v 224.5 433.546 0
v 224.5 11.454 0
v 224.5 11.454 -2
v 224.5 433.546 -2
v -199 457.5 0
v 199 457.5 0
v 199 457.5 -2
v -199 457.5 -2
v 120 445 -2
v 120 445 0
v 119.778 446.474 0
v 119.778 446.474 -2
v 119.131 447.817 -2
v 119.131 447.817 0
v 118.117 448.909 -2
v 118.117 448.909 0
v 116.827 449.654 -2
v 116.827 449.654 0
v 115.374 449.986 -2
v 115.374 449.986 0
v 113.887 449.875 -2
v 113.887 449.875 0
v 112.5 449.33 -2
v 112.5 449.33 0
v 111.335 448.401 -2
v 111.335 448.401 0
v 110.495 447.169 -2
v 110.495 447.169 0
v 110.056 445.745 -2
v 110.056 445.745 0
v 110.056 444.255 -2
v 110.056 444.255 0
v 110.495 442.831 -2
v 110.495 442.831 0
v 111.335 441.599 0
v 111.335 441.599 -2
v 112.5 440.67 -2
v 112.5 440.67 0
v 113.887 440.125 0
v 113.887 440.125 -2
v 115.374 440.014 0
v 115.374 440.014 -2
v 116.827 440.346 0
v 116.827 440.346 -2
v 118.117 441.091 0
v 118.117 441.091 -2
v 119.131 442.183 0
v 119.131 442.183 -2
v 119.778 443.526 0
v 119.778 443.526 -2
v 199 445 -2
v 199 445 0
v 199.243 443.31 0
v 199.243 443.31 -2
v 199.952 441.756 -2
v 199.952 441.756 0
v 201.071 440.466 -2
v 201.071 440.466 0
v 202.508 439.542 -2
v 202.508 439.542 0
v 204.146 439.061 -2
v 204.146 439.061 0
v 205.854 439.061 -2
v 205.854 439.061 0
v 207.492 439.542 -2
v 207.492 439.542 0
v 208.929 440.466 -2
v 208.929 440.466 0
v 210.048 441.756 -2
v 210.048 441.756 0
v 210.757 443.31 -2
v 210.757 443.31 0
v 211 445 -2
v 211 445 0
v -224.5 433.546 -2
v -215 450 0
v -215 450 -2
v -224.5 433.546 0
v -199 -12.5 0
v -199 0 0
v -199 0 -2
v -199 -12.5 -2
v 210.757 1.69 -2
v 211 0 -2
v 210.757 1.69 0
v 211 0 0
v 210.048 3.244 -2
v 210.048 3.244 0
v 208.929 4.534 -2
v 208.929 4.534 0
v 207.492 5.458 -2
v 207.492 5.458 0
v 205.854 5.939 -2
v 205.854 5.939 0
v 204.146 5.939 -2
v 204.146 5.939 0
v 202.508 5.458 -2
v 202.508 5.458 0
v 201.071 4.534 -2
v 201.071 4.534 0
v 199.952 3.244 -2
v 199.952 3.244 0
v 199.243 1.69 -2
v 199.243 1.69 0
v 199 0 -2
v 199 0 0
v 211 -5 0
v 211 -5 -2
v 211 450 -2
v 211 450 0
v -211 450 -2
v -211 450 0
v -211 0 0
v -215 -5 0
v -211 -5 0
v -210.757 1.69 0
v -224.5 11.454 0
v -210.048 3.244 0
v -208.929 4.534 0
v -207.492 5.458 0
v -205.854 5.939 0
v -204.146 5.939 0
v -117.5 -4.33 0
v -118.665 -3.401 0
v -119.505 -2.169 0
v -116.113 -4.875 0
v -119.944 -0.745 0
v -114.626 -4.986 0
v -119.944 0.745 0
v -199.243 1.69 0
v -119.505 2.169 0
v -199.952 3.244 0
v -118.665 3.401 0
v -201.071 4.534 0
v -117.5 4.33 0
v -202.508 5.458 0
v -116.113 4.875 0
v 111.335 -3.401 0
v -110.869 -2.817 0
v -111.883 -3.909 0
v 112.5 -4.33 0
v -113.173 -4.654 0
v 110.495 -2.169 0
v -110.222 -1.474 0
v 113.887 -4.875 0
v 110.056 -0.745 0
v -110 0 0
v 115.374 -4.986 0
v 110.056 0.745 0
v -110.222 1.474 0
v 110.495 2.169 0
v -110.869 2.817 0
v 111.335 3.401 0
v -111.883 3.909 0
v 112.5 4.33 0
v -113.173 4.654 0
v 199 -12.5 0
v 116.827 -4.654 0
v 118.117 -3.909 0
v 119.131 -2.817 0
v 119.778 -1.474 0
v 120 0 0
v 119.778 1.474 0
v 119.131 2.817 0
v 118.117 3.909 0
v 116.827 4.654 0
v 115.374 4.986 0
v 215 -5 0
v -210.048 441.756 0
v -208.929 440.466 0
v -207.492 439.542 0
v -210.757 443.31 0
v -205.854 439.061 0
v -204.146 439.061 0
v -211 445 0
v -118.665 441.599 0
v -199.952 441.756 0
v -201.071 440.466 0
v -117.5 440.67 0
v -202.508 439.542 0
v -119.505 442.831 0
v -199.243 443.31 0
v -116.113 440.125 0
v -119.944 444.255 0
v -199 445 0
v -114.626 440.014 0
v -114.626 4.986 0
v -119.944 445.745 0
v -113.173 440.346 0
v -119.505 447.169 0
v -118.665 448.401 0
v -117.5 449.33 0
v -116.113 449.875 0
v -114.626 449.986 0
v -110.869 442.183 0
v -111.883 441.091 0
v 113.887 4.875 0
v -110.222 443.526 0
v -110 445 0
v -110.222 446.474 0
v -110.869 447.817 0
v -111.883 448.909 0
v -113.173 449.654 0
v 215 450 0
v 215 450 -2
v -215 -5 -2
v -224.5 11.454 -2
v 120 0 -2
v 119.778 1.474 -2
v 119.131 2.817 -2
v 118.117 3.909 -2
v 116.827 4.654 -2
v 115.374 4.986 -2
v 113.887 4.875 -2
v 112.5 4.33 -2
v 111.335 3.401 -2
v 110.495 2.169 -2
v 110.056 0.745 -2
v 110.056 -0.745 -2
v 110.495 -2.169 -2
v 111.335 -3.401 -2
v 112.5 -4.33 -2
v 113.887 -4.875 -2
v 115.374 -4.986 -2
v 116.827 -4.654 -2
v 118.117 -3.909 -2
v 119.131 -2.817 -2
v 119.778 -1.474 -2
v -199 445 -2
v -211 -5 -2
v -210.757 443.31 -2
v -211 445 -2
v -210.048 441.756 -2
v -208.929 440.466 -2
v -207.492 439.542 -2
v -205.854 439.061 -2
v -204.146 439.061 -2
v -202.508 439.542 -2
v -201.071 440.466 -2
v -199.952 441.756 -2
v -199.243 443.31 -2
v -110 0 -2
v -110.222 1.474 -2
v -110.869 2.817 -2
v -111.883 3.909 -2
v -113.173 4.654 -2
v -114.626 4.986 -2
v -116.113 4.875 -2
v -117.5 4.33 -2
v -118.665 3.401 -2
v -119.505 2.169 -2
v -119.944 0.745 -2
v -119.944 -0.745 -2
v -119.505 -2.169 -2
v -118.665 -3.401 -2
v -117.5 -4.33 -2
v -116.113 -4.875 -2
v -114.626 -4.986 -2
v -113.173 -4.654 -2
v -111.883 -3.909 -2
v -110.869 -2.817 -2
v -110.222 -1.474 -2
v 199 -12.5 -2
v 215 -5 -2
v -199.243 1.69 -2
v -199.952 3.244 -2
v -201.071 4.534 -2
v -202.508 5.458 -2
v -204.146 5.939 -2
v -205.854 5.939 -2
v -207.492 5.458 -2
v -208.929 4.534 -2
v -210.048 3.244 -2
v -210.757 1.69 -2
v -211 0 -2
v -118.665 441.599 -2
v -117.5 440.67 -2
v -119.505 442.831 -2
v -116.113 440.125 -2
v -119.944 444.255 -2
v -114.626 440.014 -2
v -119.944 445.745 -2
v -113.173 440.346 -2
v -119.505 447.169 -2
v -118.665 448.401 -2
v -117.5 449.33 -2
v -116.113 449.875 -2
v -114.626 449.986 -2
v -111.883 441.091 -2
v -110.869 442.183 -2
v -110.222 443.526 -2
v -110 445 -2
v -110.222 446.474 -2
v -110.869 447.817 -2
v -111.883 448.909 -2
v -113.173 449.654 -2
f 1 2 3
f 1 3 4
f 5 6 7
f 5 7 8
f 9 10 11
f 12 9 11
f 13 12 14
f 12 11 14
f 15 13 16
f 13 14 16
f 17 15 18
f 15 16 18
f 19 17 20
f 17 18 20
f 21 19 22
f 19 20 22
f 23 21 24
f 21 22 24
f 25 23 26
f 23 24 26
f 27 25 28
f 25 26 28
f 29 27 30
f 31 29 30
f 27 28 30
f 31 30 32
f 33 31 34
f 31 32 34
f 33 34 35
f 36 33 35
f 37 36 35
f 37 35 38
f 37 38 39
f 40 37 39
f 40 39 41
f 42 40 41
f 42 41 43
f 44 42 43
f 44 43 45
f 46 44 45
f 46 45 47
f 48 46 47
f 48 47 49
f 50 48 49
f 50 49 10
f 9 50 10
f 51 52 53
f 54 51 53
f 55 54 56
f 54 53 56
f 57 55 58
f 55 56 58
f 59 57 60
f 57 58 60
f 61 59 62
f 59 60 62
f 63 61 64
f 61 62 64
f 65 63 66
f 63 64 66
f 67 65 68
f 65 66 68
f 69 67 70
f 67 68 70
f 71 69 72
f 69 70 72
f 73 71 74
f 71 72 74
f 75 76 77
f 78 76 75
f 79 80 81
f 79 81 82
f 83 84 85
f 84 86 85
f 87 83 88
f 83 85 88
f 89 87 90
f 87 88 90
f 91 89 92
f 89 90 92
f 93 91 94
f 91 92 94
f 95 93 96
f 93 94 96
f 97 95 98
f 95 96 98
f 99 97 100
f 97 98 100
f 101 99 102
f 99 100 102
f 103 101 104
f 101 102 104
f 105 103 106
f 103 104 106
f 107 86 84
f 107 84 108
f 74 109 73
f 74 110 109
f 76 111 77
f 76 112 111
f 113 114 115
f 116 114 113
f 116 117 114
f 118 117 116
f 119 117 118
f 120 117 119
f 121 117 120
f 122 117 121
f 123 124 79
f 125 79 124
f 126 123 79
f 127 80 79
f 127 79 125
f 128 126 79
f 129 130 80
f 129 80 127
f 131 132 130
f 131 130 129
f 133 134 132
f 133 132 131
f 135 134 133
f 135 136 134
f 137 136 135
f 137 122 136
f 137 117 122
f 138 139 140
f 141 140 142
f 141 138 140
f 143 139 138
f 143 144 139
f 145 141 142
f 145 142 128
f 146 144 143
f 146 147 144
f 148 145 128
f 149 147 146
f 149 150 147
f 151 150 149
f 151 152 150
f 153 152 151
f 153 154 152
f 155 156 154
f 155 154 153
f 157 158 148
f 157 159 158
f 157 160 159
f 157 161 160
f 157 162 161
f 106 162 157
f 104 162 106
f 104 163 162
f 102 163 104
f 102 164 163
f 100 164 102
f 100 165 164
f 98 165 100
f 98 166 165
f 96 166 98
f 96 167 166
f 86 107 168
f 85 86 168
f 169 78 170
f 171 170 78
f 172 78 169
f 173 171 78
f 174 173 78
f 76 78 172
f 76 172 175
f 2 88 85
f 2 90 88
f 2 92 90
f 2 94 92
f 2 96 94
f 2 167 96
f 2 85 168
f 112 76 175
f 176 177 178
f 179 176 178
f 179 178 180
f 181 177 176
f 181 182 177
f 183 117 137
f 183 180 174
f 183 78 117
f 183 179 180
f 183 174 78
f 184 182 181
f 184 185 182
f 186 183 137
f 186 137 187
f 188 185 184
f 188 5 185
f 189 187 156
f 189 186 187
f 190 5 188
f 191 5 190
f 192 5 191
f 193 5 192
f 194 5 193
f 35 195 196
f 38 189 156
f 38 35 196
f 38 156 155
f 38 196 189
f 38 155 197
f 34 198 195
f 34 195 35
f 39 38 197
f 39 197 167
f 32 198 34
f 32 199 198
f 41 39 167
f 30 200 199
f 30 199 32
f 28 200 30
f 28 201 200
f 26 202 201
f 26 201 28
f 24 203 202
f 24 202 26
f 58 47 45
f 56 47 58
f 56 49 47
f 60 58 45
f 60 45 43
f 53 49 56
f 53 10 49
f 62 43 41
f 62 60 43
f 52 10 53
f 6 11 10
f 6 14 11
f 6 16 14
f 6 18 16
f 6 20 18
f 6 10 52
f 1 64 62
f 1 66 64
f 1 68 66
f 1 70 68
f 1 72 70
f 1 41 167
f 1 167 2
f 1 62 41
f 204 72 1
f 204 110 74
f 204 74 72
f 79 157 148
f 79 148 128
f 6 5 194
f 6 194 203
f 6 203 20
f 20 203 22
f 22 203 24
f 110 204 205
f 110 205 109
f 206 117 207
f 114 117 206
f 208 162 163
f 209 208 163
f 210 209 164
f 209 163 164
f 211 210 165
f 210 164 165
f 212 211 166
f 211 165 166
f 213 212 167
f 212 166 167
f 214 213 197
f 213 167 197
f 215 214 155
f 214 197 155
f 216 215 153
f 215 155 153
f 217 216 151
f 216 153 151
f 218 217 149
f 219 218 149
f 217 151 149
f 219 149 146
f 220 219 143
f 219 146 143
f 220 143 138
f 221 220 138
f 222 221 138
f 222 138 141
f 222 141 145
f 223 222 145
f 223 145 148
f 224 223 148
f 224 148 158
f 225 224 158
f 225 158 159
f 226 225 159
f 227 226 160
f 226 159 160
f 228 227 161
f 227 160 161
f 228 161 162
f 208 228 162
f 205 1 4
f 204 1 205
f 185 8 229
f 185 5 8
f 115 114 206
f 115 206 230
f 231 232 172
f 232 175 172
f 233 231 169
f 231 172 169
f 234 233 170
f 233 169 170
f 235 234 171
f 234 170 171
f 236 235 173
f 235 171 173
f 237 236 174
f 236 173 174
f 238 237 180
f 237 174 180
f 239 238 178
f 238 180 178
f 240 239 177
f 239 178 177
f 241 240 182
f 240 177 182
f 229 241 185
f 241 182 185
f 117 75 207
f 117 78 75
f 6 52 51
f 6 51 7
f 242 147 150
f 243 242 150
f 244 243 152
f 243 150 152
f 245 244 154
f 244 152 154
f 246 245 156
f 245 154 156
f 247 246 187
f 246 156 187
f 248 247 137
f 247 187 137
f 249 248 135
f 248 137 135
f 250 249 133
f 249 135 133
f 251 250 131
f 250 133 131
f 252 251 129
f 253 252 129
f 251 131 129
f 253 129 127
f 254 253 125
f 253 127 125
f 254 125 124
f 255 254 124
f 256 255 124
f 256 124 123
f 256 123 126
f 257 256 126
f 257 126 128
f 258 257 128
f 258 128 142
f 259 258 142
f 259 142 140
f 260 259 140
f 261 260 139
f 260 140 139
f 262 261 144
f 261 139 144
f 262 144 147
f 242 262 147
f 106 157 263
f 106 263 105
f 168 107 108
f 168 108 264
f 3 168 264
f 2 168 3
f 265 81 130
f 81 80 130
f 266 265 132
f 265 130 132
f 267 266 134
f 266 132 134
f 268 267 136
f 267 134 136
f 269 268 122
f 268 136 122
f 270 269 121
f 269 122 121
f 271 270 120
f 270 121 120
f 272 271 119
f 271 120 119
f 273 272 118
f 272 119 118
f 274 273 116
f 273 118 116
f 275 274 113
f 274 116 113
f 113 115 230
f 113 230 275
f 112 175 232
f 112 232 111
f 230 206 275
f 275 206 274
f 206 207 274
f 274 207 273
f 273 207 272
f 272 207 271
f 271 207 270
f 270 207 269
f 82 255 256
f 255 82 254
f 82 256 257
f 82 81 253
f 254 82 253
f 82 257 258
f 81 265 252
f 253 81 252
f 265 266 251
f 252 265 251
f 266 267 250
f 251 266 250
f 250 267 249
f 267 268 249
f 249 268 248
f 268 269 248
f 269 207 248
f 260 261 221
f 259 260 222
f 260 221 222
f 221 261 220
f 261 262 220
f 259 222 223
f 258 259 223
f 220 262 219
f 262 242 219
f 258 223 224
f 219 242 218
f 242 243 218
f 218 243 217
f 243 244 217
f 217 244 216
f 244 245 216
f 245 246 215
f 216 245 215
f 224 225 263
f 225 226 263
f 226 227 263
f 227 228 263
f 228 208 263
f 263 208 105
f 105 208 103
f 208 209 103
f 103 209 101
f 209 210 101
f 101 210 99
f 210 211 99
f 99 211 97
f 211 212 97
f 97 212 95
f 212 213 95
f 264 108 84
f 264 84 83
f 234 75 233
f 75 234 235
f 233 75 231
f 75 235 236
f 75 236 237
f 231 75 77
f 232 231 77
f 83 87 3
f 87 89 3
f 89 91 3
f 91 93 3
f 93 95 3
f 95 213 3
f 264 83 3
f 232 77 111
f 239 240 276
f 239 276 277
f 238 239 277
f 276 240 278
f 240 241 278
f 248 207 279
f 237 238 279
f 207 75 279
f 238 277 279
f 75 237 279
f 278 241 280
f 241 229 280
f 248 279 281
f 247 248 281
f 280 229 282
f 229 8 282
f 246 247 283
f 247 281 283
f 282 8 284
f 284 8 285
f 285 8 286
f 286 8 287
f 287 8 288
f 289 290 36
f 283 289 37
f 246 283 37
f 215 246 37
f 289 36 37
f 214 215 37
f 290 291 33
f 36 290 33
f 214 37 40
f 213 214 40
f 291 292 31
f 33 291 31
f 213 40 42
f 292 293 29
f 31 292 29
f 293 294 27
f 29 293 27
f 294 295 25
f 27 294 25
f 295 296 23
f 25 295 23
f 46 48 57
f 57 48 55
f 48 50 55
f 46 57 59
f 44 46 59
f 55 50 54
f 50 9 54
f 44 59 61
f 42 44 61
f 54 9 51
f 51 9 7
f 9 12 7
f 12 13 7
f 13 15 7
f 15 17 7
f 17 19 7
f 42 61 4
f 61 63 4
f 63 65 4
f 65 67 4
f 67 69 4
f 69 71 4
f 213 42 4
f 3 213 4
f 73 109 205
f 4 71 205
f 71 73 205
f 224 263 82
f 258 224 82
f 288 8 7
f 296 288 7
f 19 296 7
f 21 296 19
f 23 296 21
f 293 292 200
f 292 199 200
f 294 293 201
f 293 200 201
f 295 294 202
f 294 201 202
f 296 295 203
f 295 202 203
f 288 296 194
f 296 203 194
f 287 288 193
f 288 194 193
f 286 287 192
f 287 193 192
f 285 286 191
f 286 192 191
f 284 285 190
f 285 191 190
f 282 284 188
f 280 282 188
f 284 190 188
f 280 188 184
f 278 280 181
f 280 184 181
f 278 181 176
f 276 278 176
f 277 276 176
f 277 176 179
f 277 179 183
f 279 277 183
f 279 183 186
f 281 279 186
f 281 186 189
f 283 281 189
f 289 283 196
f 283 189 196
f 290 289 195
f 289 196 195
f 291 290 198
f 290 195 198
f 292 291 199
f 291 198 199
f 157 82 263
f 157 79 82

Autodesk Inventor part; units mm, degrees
sketch "Skizze_2" plane through (0, 0, 0) normal (0, 0, 1) x (1, 0, 0)
  line L0 (-224.5, 433.5455) -> (-224.5, 11.4545)
  line L1 (-224.5, 11.4545) -> (-215, -5)
  line L2 (-215, -5) -> (-211, -5)
  line L3 (-211, -5) -> (-211, 0)
  arc A0 (-199, 0) -> (-211, 0) centre (-205, 0) ccw
  line L4 (-199, 0) -> (-199, -12.5)
  line L5 (-199, -12.5) -> (199, -12.5)
  line L6 (199, -12.5) -> (199, 0)
  arc A1 (211, 0) -> (199, 0) centre (205, 0) ccw
  line L7 (211, 0) -> (211, -5)
  line L8 (211, -5) -> (215, -5)
  line L9 (215, -5) -> (224.5, 11.4545)
  line L10 (224.5, 11.4545) -> (224.5, 433.5455)
  line L11 (224.5, 433.5455) -> (215, 450)
  line L12 (215, 450) -> (211, 450)
  line L13 (211, 450) -> (211, 445)
  arc A2 (199, 445) -> (211, 445) centre (205, 445) ccw
  line L14 (199, 445) -> (199, 457.5)
  line L15 (199, 457.5) -> (-199, 457.5)
  line L16 (-199, 457.5) -> (-199, 445)
  arc A3 (-211, 445) -> (-199, 445) centre (-205, 445) ccw
  line L17 (-211, 445) -> (-211, 450)
  line L18 (-211, 450) -> (-215, 450)
  line L19 (-215, 450) -> (-224.5, 433.5455)
  circle A4 centre (115, 445) radius 5
  circle A5 centre (115, 0) radius 5
  circle A6 centre (-115, 445) radius 5
  circle A7 centre (-115, 0) radius 5
extrude "Extrusion1" add sketch "Skizze_2" against normal blind 2
ref_plane "DPF11_XY" through (224.5, 222.5, 0) normal (0, 0, 1) x (1, 0, 0)
ref_plane "DPF11_YZ" through (224.5, 222.5, 0) normal (1, 0, 0) x (0, 1, 0)
ref_plane "DPF11_ZX" through (224.5, 222.5, 0) normal (0, 1, 0) x (0, 0, 1)
ref_plane "DPF12_XY" through (-224.5, 222.5, 0) normal (0, 0, 1) x (1, 0, 0)
ref_plane "DPF12_YZ" through (-224.5, 222.5, 0) normal (1, 0, 0) x (0, 1, 0)
ref_plane "DPF12_ZX" through (-224.5, 222.5, 0) normal (0, 1, 0) x (0, 0, 1)
ref_plane "DPF21_XY" through (205, 445, 0) normal (0, 0, 1) x (1, 0, 0)
ref_plane "DPF21_YZ" through (205, 445, 0) normal (1, 0, 0) x (0, 1, 0)
ref_plane "DPF21_ZX" through (205, 445, 0) normal (0, 1, 0) x (0, 0, 1)
ref_plane "DPF22_XY" through (-205, 445, 0) normal (0, 0, 1) x (1, 0, 0)
ref_plane "DPF22_YZ" through (-205, 445, 0) normal (1, 0, 0) x (0, 1, 0)
ref_plane "DPF22_ZX" through (-205, 445, 0) normal (0, 1, 0) x (0, 0, 1)
ref_plane "DPG11_XY" through (0, -12.5, 0) normal (0, 0, 1) x (1, 0, 0)
ref_plane "DPG11_YZ" through (0, -12.5, 0) normal (1, 0, 0) x (0, 1, 0)
ref_plane "DPG11_ZX" through (0, -12.5, 0) normal (0, 1, 0) x (0, 0, 1)
ref_plane "DPG12_XY" through (0, 457.5, 0) normal (0, 0, 1) x (1, 0, 0)
ref_plane "DPG12_YZ" through (0, 457.5, 0) normal (1, 0, 0) x (0, 1, 0)
ref_plane "DPG12_ZX" through (0, 457.5, 0) normal (0, 1, 0) x (0, 0, 1)
ref_plane "DPG21_XY" through (205, 0, 0) normal (0, 0, 1) x (1, 0, 0)
ref_plane "DPG21_YZ" through (205, 0, 0) normal (1, 0, 0) x (0, 1, 0)
ref_plane "DPG21_ZX" through (205, 0, 0) normal (0, 1, 0) x (0, 0, 1)
ref_plane "DPG22_XY" through (205, 445, 0) normal (0, 0, 1) x (1, 0, 0)
ref_plane "DPG22_YZ" through (205, 445, 0) normal (1, 0, 0) x (0, 1, 0)
ref_plane "DPG22_ZX" through (205, 445, 0) normal (0, 1, 0) x (0, 0, 1)
ref_plane "montageplatte_XY" through (-205, 0, 0) normal (0, 0, 1) x (1, 0, 0)
ref_plane "montageplatte_YZ" through (-205, 0, 0) normal (1, 0, 0) x (0, 1, 0)
ref_plane "montageplatte_ZX" through (-205, 0, 0) normal (0, 1, 0) x (0, 0, 1)
properties part number "AE 1050_01_00 MontagePlatte"
